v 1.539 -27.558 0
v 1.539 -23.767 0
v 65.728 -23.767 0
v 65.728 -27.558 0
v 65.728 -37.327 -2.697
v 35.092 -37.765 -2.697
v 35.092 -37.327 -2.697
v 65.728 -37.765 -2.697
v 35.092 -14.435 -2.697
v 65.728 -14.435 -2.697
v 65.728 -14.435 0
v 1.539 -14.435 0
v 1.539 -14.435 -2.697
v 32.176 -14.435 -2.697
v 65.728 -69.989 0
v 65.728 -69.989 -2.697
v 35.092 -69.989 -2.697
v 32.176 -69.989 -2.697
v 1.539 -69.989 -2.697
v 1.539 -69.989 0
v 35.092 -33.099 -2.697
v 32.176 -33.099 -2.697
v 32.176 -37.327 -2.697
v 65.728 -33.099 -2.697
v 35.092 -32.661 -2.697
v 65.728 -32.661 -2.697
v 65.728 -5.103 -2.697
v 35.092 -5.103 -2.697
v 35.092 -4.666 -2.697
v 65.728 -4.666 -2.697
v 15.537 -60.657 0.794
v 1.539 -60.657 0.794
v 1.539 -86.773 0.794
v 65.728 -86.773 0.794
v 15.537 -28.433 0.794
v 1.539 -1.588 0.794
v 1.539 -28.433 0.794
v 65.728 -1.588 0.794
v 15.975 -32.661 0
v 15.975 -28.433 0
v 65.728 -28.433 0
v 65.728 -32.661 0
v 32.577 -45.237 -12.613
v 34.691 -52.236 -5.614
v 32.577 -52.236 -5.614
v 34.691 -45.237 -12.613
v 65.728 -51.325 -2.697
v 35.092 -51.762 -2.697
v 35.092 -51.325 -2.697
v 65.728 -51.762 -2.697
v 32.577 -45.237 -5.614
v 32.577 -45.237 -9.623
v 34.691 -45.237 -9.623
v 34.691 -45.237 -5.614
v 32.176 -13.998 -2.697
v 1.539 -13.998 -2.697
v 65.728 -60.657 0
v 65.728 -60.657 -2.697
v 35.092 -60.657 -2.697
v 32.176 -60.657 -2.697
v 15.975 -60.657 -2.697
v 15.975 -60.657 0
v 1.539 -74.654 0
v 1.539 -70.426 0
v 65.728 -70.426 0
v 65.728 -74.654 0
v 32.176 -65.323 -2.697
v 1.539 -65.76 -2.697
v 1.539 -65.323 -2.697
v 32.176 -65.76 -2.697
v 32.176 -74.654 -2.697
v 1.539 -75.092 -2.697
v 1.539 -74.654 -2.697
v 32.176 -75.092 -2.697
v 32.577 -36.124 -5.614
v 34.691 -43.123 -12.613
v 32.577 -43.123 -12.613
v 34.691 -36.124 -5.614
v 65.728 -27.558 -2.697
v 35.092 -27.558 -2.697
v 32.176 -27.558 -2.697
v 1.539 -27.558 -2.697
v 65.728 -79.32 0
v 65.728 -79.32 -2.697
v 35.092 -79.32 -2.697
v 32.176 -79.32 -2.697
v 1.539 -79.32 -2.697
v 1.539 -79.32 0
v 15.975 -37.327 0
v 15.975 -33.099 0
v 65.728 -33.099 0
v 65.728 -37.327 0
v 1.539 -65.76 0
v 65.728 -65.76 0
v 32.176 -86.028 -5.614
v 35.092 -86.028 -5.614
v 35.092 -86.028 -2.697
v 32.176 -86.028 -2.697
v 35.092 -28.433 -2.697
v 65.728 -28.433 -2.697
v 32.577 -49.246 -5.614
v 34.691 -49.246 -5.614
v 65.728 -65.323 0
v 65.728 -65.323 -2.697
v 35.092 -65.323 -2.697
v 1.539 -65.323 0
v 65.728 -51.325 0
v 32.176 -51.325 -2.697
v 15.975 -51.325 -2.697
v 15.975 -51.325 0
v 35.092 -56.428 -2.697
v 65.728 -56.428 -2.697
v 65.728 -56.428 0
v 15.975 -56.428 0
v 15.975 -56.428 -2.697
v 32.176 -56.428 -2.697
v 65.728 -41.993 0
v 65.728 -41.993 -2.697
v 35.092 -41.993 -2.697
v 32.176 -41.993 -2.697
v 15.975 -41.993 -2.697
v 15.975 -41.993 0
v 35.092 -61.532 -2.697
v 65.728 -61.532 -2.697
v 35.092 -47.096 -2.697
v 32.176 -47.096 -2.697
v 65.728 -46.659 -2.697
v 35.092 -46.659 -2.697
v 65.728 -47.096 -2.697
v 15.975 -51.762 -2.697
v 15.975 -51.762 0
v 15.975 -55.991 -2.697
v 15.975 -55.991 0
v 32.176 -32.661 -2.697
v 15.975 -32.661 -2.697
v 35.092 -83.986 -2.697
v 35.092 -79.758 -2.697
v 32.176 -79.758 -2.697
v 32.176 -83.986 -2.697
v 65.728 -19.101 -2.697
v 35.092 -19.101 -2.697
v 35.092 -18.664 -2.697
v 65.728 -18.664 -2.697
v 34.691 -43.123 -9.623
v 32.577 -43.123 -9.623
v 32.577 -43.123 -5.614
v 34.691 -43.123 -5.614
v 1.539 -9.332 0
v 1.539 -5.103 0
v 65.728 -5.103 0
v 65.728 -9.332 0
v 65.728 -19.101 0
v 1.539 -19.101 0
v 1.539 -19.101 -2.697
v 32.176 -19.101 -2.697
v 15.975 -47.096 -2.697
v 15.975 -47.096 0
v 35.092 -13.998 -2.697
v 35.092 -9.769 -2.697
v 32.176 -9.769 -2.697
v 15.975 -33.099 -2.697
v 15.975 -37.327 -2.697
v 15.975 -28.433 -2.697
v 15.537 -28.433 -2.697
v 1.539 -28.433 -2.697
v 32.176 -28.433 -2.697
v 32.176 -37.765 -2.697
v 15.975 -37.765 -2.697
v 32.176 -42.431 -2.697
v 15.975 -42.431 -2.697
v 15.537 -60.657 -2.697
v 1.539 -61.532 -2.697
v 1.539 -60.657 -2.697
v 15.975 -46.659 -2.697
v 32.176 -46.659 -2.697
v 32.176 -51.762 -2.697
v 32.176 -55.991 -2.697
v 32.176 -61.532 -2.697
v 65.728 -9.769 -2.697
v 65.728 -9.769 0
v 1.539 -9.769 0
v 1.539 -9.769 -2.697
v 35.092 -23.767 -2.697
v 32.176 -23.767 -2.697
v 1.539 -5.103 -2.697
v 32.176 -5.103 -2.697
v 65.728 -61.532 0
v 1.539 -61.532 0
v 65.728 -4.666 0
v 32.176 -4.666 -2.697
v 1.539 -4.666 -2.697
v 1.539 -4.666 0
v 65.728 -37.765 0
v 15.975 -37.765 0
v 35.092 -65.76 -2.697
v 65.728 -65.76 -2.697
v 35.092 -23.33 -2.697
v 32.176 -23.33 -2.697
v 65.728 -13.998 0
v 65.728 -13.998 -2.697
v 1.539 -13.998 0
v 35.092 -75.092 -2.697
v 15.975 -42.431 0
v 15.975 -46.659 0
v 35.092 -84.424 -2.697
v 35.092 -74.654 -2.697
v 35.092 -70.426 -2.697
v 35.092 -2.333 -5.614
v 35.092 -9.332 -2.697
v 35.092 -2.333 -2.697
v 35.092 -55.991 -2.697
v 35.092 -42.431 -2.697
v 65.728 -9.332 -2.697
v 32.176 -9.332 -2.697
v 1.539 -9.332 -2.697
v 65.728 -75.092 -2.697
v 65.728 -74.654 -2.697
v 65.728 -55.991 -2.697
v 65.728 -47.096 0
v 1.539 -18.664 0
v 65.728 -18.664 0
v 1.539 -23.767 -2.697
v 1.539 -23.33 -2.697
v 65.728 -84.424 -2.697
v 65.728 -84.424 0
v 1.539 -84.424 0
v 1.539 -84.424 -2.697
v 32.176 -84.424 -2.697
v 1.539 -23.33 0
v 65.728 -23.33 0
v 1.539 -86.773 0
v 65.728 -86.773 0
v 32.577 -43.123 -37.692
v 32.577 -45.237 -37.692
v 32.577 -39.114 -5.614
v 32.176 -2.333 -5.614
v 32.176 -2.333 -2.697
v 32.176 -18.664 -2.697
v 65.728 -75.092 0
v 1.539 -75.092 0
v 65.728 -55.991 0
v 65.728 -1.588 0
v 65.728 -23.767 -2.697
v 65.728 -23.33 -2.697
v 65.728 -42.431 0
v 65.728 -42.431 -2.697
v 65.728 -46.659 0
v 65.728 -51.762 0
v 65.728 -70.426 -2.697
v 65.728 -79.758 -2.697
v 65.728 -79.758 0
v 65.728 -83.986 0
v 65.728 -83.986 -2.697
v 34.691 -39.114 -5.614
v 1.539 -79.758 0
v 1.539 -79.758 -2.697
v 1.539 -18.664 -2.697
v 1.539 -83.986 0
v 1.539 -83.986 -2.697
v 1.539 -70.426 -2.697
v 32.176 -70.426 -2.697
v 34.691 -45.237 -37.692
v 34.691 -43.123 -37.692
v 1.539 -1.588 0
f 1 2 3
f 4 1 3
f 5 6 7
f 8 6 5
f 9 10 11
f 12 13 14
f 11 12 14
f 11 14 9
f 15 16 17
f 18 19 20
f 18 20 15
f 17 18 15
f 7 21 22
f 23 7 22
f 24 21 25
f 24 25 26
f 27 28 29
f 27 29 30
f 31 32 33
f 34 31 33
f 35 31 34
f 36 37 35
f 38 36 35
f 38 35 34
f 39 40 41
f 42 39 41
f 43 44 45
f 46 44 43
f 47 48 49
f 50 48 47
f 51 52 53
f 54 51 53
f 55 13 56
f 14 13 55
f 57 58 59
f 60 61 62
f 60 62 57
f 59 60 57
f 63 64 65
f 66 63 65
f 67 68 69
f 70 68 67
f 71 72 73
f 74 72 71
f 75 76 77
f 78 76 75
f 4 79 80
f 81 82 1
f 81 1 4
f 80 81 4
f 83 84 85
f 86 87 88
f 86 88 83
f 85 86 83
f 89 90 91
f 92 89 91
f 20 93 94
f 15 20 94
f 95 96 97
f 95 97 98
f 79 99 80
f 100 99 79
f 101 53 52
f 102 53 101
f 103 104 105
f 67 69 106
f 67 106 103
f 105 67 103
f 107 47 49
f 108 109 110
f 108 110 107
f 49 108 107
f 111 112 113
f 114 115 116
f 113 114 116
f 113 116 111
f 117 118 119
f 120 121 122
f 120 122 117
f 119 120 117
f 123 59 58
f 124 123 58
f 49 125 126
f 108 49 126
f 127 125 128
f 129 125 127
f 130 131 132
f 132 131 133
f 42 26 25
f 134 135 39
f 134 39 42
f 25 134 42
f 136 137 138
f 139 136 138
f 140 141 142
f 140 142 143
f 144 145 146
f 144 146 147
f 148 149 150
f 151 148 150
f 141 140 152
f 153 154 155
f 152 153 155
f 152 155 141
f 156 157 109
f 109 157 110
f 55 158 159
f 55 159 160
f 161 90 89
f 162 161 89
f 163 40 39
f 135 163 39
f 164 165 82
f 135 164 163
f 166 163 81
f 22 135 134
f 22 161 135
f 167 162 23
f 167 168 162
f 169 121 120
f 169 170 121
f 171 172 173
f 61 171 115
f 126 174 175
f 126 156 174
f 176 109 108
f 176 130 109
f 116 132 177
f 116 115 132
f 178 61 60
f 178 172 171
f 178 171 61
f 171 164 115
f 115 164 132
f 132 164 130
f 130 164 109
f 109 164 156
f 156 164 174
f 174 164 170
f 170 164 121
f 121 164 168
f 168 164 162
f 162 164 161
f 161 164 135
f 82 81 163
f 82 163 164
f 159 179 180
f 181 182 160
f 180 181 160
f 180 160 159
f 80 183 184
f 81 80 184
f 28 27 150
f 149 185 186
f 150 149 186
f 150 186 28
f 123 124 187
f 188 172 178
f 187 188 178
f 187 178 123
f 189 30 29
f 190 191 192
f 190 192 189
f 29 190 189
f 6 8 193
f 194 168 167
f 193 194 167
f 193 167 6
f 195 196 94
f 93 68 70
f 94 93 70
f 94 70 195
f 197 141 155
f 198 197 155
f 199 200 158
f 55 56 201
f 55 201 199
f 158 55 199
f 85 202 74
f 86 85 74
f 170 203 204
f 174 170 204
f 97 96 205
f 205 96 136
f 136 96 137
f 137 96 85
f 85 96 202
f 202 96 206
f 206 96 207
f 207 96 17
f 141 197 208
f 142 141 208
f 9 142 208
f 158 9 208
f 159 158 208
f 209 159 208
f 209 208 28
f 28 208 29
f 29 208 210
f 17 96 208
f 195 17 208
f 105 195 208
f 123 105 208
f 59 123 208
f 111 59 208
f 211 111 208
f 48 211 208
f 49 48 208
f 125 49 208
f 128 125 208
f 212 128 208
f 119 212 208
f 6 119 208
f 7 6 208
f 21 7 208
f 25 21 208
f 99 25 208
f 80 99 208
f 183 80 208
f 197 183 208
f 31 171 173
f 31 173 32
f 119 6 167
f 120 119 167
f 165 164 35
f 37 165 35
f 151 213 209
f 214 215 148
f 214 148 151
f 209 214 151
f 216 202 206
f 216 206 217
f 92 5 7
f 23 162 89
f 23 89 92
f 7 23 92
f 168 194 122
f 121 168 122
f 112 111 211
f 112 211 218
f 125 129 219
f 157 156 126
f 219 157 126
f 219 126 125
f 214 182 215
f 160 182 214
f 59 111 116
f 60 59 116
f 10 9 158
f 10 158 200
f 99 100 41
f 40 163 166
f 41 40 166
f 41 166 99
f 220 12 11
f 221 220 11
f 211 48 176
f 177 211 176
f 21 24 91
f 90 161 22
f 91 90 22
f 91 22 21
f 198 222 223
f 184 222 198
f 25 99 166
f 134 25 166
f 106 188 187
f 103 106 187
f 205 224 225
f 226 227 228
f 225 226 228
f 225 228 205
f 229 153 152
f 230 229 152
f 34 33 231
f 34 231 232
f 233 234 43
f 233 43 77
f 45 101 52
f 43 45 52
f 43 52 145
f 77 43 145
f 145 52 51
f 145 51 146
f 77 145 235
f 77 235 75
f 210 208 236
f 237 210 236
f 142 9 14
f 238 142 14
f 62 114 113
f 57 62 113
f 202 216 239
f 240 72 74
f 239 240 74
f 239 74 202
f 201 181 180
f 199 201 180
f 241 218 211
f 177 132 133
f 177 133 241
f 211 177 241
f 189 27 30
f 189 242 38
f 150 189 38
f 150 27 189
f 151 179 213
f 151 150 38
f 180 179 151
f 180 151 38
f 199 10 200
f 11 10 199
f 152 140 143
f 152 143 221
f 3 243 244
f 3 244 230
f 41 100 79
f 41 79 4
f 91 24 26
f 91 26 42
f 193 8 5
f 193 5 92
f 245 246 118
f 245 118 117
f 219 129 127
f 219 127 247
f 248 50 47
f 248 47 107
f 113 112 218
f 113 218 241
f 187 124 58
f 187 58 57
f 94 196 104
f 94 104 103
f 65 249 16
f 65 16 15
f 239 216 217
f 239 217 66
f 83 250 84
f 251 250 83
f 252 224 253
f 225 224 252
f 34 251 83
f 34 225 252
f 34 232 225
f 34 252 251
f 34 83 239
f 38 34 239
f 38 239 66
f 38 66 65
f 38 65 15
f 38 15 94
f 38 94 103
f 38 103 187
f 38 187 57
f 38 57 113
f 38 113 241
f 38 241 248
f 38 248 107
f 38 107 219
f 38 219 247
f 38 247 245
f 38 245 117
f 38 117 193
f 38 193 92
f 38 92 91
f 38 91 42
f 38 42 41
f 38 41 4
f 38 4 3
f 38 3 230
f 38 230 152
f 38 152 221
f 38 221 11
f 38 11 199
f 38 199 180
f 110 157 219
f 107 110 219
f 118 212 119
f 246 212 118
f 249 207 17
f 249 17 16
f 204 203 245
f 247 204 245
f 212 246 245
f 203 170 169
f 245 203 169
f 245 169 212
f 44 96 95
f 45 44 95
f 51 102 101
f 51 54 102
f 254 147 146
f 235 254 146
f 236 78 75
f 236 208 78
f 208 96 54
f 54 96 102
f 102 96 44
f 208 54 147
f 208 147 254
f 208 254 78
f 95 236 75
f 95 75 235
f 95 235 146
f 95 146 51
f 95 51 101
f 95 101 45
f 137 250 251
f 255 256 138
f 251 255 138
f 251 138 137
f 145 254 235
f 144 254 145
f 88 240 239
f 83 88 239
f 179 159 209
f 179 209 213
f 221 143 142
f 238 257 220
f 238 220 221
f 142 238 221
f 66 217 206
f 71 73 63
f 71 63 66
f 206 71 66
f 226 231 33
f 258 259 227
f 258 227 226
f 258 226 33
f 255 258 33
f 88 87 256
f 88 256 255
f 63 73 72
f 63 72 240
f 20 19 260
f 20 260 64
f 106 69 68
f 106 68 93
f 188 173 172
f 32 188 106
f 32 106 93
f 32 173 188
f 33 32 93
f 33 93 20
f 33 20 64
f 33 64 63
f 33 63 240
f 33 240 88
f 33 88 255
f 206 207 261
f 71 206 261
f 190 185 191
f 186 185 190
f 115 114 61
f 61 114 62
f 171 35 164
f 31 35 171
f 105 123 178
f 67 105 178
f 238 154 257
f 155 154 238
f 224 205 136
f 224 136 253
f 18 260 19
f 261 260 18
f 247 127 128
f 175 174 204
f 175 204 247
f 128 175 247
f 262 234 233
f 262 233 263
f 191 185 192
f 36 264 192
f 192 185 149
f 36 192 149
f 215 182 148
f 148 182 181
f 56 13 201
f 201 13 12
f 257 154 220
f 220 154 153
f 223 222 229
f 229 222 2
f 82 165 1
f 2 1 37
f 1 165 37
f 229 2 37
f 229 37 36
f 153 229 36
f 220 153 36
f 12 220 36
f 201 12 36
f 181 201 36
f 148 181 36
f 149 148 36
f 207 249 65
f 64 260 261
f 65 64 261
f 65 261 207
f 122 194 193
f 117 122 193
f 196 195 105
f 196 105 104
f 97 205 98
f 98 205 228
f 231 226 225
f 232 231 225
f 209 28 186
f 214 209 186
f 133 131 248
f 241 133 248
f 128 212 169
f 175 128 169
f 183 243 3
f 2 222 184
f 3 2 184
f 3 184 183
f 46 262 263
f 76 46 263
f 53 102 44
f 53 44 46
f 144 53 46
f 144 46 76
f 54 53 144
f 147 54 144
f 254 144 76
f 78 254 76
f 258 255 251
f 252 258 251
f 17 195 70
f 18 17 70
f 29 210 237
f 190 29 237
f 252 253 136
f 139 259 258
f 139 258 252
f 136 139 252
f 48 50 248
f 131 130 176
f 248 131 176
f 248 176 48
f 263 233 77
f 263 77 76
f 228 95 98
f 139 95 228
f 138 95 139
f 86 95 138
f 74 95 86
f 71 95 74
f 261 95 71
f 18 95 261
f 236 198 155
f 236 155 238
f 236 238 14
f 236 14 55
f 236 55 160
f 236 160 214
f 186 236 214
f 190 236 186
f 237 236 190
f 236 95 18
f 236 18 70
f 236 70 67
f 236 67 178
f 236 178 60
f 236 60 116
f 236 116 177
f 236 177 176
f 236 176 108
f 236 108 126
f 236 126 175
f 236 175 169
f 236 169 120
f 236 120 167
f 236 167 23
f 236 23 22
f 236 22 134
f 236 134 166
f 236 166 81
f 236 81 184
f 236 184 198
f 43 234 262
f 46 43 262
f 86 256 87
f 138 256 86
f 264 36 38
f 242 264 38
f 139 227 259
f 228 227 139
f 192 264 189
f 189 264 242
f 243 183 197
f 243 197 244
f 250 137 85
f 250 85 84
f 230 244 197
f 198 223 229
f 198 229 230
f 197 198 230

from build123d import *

# Parameters (mm, degrees)
F0_W      = 5867.4
F0_H      = 7696.2
F1_DEPTH  = 69.135625
F2_W      = 5867.4
F2_H      = 7696.2
F2_W_2    = 5791.2
F2_H_2    = 7620
F3_DEPTH  = 234.95
F4_W      = 38.1
F4_H      = 234.95
F5_DEPTH  = 5863.2060388453
F7_W      = 254
F7_H      = 254
F8_DEPTH  = 7289.8
F9_W      = 184.15
F9_H      = 184.15
F10_DEPTH = 2794
F12_DEPTH = 184.15
F13_W     = 5867.4
F13_H     = 7696.2
F13_W_2   = 5590.8448
F13_H_2   = 7419.6448
F14_DEPTH = 304.085625
F15_W     = 1219.2
F15_H     = 2806.7
F16_DEPTH = 304.8
F17_W     = 368.3
F17_H     = 234.95
F18_DEPTH = 38.1
F19_DEPTH = 38.1
F20_DEPTH = 38.1
F21_SCALE = 0.0114810563


with BuildPart() as f1:
    # F0 (on Top) → F1 (new body)
    with BuildSketch(Plane.XY):
        with Locations((2929.5060388453, -3848.1)):
            Rectangle(F0_W, F0_H)
    extrude(amount=F1_DEPTH)

    # F2 (on face) → F3 (join)
    with BuildSketch(Plane(origin=(0, 0, 0), x_dir=(1, 0, 0), z_dir=(0, 0, -1))):
        with Locations((2929.5060388453, 3848.1)):
            Rectangle(F2_W, F2_H)
        with Locations((2929.5060388453, 3848.1)):
            Rectangle(F2_W_2, F2_H_2, mode=Mode.SUBTRACT)
    extrude(amount=F3_DEPTH)

    # F4 (on Right) → F5 (join, through all)
    with BuildSketch(Plane.YZ):
        with Locations((-425.45, -117.475)):
            Rectangle(F4_W, F4_H)
        with Locations((-831.85, -117.475)):
            Rectangle(F4_W, F4_H)
        with Locations((-1238.25, -117.475)):
            Rectangle(F4_W, F4_H)
        with Locations((-1644.65, -117.475)):
            Rectangle(F4_W, F4_H)
        with Locations((-2051.05, -117.475)):
            Rectangle(F4_W, F4_H)
        with Locations((-2457.45, -117.475)):
            Rectangle(F4_W, F4_H)
        with Locations((-2863.85, -117.475)):
            Rectangle(F4_W, F4_H)
        with Locations((-3270.25, -117.475)):
            Rectangle(F4_W, F4_H)
        with Locations((-3676.65, -117.475)):
            Rectangle(F4_W, F4_H)
        with Locations((-4083.05, -117.475)):
            Rectangle(F4_W, F4_H)
        with Locations((-4489.45, -117.475)):
            Rectangle(F4_W, F4_H)
        with Locations((-4895.85, -117.475)):
            Rectangle(F4_W, F4_H)
        with Locations((-5302.25, -117.475)):
            Rectangle(F4_W, F4_H)
        with Locations((-5708.65, -117.475)):
            Rectangle(F4_W, F4_H)
        with Locations((-6115.05, -117.475)):
            Rectangle(F4_W, F4_H)
        with Locations((-6521.45, -117.475)):
            Rectangle(F4_W, F4_H)
        with Locations((-6927.85, -117.475)):
            Rectangle(F4_W, F4_H)
        with Locations((-7334.25, -117.475)):
            Rectangle(F4_W, F4_H)
    extrude(amount=F5_DEPTH)

    # F7 (on offset) → F8 (join)
    with BuildSketch(Plane(origin=(0, -203.2, 0), x_dir=(-1, 0, 0), z_dir=(0, 1, 0))):
        with Locations((-2929.5060388453, -361.95)):
            Rectangle(F7_W, F7_H)
    extrude(amount=-F8_DEPTH)

    # F9 (on face) → F10 (join)
    with BuildSketch(Plane(origin=(0, 0, -488.95), x_dir=(1, 0, 0), z_dir=(0, 0, -1))):
        with Locations((2929.5060388453, 3848.1)):
            Rectangle(F9_W, F9_H)
    extrude(amount=F10_DEPTH)

    # F11 (on face) → F12 (join, through all)
    with BuildSketch(Plane.YZ.offset(3021.5810388453)):
        Polygon((-3940.175, -838.122572489), (-4289.347572489, -488.95), (-4549.775, -488.95), (-3940.175, -1098.55), align=None)
        Polygon((-3406.852427511, -488.95), (-3756.025, -838.122572489), (-3756.025, -1098.55), (-3146.425, -488.95), align=None)
    extrude(amount=-F12_DEPTH)

    # F13 (on face) → F14 (cut, through all)
    with BuildSketch(Plane.XY.offset(69.135625)):
        with Locations((2929.5060388453, -3848.1)):
            Rectangle(F13_W, F13_H)
        with Locations((2929.5060388453, -3848.1)):
            Rectangle(F13_W_2, F13_H_2, mode=Mode.SUBTRACT)
    extrude(amount=-F14_DEPTH, mode=Mode.SUBTRACT)

    # F15 (on face) → F16 (cut)
    with BuildSketch(Plane.XY.offset(69.135625)):
        with Locations((743.6836388453, -3879.85)):
            Rectangle(F15_W, F15_H)
    extrude(amount=-F16_DEPTH, mode=Mode.SUBTRACT)

    # F17 (on face) → F18 (join)
    with BuildSketch(Plane(origin=(1353.2836388453, 0, 0), x_dir=(0, -1, 0), z_dir=(-1, 0, 0))):
        with Locations((2660.65, -117.475)):
            Rectangle(F17_W, F17_H)
        with Locations((3067.05, -117.475)):
            Rectangle(F17_W, F17_H)
        with Locations((3473.45, -117.475)):
            Rectangle(F17_W, F17_H)
        with Locations((3879.85, -117.475)):
            Rectangle(F17_W, F17_H)
        with Locations((4286.25, -117.475)):
            Rectangle(F17_W, F17_H)
        with Locations((4692.65, -117.475)):
            Rectangle(F17_W, F17_H)
        with Locations((5099.05, -117.475)):
            Rectangle(F17_W, F17_H)
    extrude(amount=-F18_DEPTH)

    # F19 (add): a face of the model
    f19_faces = [f1.faces().sort_by_distance(p)[0] for p in [
        (2929.5060388453, -5321.3, -117.475),
    ]]
    extrude(f19_faces, amount=F19_DEPTH)

    # F20 (add): a face of the model
    f20_faces = [f1.faces().sort_by_distance(p)[0] for p in [
        (2929.5060388453, -2438.4, -117.475),
    ]]
    extrude(f20_faces, amount=F20_DEPTH)


with BuildPart() as f1_1:
    # F21: moved
    add(f1.part.scale(F21_SCALE))


solid = f1_1.part
